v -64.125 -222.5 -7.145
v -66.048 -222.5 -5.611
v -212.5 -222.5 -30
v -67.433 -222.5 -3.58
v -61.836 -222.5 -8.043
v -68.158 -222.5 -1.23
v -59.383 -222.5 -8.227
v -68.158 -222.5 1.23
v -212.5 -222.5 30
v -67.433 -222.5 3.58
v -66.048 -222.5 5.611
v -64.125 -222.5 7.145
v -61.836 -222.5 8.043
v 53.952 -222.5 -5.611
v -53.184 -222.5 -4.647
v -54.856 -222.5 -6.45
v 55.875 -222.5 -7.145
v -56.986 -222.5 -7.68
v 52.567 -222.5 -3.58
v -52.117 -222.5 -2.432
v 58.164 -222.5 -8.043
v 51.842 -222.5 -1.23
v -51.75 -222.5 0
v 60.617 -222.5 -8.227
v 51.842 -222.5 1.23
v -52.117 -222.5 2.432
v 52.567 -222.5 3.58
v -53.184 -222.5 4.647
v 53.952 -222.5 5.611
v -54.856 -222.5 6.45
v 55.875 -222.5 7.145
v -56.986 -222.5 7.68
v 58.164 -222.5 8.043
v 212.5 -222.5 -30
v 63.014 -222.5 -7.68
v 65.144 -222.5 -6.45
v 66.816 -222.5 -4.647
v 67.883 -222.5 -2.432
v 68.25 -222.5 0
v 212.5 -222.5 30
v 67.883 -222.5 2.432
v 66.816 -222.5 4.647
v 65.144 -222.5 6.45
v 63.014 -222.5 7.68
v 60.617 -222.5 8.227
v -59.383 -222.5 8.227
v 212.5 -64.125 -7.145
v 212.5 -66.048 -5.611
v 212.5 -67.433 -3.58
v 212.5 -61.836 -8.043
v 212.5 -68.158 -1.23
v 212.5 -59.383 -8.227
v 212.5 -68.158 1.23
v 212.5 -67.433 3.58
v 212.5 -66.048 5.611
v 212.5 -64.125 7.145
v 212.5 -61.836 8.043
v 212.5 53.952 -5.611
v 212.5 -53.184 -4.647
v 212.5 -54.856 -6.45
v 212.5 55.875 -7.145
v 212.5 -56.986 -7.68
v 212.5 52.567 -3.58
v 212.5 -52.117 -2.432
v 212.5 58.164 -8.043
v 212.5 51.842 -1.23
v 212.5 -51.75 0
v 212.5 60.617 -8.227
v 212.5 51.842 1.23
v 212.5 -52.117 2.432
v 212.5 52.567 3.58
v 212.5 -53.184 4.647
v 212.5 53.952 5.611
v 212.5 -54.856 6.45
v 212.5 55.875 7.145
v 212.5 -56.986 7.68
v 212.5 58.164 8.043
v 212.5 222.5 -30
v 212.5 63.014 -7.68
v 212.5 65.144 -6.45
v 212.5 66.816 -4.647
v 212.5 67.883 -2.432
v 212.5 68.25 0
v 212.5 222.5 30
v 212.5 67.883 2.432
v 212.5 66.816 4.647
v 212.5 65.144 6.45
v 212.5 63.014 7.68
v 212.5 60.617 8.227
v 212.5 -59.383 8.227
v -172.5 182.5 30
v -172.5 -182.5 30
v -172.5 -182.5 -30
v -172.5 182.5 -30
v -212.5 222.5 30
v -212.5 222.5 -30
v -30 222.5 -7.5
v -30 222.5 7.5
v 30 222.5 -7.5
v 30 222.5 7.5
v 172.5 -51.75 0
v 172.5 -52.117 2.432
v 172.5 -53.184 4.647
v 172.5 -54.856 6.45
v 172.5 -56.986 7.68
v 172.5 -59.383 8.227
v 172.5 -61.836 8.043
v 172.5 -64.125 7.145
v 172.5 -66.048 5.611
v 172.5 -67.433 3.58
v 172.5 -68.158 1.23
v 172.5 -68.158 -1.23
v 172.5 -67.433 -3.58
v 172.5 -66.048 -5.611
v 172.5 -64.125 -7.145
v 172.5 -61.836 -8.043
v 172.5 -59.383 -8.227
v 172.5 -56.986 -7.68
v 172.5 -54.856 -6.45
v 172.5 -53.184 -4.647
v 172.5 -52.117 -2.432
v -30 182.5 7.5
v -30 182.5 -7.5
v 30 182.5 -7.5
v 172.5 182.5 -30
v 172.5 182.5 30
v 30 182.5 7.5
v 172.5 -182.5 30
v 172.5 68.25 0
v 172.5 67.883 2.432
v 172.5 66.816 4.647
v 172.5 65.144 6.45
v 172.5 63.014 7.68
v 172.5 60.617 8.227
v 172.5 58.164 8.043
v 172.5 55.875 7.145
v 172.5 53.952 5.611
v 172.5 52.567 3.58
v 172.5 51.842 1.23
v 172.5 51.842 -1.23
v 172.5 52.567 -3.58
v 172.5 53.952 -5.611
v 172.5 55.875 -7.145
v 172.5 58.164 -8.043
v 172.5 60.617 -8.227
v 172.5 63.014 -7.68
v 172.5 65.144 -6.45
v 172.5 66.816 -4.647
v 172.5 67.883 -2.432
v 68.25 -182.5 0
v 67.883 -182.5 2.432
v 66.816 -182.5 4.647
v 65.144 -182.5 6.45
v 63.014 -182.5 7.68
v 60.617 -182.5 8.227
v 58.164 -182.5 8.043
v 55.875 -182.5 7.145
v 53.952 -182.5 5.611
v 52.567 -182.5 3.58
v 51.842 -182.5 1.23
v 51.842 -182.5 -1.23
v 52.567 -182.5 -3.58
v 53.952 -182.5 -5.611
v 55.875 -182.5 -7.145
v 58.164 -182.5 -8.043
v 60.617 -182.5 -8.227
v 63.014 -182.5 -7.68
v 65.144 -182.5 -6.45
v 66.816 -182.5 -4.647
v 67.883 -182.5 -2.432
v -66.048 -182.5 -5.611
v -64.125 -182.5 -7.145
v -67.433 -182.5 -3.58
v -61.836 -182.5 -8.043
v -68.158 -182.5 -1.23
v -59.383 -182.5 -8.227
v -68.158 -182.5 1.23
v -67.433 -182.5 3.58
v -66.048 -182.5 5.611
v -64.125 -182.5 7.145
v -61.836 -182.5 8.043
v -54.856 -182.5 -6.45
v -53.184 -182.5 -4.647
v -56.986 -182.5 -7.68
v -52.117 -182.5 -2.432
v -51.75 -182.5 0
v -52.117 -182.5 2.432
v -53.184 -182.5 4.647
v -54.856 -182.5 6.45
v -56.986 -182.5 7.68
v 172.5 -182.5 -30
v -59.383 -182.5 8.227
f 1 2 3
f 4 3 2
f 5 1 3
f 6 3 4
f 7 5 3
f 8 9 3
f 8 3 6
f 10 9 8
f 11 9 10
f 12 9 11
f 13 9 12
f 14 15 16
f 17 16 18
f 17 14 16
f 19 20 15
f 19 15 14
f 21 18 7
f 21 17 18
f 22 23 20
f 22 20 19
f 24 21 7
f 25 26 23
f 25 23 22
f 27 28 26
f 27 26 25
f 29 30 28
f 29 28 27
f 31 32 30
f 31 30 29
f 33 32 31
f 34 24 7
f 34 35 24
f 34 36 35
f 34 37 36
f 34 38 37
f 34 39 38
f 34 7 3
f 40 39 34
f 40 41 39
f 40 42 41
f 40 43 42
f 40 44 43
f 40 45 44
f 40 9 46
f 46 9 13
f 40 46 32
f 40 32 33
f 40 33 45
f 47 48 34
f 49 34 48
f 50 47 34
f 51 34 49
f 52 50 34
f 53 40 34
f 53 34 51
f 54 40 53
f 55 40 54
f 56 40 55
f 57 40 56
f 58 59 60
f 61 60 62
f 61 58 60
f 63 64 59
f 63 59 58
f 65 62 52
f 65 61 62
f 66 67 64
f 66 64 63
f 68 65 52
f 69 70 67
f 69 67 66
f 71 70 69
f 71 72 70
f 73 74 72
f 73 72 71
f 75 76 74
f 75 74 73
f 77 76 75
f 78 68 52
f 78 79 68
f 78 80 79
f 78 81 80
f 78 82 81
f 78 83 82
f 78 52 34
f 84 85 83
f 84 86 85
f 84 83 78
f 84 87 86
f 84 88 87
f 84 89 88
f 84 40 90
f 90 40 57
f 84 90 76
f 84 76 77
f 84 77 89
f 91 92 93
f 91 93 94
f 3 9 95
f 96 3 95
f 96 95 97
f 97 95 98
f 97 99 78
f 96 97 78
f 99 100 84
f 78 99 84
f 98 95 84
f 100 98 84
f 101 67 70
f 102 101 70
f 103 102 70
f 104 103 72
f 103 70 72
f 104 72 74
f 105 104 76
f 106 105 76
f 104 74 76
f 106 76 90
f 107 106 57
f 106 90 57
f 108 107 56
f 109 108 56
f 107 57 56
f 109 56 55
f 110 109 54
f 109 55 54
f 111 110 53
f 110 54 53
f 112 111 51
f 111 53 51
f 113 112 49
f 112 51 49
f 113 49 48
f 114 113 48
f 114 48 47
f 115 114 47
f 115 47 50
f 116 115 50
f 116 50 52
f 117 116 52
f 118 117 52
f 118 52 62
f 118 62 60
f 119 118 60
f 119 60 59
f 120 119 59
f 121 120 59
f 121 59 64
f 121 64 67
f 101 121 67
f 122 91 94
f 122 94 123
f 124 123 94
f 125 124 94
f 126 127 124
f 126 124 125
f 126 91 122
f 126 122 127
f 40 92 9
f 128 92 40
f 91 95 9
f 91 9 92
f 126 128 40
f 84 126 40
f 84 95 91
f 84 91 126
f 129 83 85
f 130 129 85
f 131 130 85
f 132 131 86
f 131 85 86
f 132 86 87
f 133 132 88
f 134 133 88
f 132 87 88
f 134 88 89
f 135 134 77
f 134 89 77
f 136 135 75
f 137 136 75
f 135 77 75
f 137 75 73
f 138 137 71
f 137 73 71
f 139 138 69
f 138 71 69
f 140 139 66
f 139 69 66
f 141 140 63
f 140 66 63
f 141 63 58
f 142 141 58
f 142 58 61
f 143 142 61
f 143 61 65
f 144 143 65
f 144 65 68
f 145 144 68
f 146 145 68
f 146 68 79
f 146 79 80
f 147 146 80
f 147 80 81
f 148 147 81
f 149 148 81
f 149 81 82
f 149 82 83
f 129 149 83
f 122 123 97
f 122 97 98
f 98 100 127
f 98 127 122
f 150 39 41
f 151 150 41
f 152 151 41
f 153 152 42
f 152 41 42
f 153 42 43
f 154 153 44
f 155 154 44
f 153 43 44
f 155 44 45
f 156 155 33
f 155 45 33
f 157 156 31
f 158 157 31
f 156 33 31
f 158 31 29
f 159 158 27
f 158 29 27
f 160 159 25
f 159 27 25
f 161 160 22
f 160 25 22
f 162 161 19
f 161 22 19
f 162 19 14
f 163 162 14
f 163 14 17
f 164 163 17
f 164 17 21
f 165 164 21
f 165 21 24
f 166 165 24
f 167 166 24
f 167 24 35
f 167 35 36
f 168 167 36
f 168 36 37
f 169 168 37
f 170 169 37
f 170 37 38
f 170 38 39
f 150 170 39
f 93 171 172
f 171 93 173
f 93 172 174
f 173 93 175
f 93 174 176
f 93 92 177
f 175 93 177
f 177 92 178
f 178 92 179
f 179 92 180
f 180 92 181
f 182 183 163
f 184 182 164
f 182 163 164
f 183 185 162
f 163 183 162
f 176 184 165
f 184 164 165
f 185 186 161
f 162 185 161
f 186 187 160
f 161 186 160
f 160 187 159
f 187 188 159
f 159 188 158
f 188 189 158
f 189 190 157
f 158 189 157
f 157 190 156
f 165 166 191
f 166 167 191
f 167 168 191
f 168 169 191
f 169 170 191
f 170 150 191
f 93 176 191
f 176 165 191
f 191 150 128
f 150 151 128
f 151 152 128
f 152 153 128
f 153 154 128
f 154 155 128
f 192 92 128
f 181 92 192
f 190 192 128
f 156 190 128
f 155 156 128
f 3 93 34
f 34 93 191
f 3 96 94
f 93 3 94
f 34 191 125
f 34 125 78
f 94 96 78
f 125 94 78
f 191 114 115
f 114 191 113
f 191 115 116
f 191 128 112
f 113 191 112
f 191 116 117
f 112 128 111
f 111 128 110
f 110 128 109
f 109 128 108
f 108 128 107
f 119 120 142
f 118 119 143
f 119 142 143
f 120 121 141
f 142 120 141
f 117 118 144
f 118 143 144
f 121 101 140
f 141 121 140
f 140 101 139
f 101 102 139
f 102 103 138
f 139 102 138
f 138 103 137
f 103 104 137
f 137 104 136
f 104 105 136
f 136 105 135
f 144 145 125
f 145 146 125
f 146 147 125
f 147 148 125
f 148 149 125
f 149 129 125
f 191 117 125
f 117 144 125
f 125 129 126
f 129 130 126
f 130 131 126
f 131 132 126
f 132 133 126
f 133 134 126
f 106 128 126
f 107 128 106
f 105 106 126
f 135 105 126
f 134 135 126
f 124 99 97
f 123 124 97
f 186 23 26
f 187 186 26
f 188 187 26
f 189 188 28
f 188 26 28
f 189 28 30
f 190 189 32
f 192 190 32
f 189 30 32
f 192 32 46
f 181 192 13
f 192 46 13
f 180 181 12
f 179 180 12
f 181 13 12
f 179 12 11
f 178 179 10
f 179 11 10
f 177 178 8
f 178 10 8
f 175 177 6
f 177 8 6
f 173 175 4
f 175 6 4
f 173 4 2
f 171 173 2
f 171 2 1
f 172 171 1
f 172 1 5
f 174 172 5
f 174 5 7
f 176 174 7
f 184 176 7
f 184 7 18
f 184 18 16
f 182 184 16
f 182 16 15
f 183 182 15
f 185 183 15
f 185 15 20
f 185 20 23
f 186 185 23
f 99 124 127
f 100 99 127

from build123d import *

# Parameters (mm, degrees)
F0_W     = 425
F0_H     = 445
F0_W_2   = 345
F0_H_2   = 365
F1_DEPTH = 30
F2_R     = 8.25
F3_DEPTH = 80
F4_R     = 8.25
F5_DEPTH = 80
F6_W     = 60
F6_H     = 15
F7_DEPTH = 80


with BuildPart() as f1:
    # F0 (on Top) → F1 (new body, symmetric)
    with BuildSketch(Plane.XY):
        Rectangle(F0_W, F0_H)
        Rectangle(F0_W_2, F0_H_2, mode=Mode.SUBTRACT)
    extrude(amount=F1_DEPTH, both=True)

    # F2 (on face) → F3 (cut)
    with BuildSketch(Plane.XZ.offset(222.5)):
        with Locations((-60, 0)):
            Circle(F2_R)
        with Locations((60, 0)):
            Circle(F2_R)
    extrude(amount=-F3_DEPTH, mode=Mode.SUBTRACT)

    # F4 (on face) → F5 (cut)
    with BuildSketch(Plane.YZ.offset(212.5)):
        with Locations((60, 0)):
            Circle(F4_R)
        with Locations((-60, 0)):
            Circle(F4_R)
    extrude(amount=-F5_DEPTH, mode=Mode.SUBTRACT)

    # F6 (on face) → F7 (cut)
    with BuildSketch(Plane(origin=(0, 222.5, 0), x_dir=(-1, 0, 0), z_dir=(0, 1, 0))):
        Rectangle(F6_W, F6_H)
    extrude(amount=-F7_DEPTH, mode=Mode.SUBTRACT)


solid = f1.part
